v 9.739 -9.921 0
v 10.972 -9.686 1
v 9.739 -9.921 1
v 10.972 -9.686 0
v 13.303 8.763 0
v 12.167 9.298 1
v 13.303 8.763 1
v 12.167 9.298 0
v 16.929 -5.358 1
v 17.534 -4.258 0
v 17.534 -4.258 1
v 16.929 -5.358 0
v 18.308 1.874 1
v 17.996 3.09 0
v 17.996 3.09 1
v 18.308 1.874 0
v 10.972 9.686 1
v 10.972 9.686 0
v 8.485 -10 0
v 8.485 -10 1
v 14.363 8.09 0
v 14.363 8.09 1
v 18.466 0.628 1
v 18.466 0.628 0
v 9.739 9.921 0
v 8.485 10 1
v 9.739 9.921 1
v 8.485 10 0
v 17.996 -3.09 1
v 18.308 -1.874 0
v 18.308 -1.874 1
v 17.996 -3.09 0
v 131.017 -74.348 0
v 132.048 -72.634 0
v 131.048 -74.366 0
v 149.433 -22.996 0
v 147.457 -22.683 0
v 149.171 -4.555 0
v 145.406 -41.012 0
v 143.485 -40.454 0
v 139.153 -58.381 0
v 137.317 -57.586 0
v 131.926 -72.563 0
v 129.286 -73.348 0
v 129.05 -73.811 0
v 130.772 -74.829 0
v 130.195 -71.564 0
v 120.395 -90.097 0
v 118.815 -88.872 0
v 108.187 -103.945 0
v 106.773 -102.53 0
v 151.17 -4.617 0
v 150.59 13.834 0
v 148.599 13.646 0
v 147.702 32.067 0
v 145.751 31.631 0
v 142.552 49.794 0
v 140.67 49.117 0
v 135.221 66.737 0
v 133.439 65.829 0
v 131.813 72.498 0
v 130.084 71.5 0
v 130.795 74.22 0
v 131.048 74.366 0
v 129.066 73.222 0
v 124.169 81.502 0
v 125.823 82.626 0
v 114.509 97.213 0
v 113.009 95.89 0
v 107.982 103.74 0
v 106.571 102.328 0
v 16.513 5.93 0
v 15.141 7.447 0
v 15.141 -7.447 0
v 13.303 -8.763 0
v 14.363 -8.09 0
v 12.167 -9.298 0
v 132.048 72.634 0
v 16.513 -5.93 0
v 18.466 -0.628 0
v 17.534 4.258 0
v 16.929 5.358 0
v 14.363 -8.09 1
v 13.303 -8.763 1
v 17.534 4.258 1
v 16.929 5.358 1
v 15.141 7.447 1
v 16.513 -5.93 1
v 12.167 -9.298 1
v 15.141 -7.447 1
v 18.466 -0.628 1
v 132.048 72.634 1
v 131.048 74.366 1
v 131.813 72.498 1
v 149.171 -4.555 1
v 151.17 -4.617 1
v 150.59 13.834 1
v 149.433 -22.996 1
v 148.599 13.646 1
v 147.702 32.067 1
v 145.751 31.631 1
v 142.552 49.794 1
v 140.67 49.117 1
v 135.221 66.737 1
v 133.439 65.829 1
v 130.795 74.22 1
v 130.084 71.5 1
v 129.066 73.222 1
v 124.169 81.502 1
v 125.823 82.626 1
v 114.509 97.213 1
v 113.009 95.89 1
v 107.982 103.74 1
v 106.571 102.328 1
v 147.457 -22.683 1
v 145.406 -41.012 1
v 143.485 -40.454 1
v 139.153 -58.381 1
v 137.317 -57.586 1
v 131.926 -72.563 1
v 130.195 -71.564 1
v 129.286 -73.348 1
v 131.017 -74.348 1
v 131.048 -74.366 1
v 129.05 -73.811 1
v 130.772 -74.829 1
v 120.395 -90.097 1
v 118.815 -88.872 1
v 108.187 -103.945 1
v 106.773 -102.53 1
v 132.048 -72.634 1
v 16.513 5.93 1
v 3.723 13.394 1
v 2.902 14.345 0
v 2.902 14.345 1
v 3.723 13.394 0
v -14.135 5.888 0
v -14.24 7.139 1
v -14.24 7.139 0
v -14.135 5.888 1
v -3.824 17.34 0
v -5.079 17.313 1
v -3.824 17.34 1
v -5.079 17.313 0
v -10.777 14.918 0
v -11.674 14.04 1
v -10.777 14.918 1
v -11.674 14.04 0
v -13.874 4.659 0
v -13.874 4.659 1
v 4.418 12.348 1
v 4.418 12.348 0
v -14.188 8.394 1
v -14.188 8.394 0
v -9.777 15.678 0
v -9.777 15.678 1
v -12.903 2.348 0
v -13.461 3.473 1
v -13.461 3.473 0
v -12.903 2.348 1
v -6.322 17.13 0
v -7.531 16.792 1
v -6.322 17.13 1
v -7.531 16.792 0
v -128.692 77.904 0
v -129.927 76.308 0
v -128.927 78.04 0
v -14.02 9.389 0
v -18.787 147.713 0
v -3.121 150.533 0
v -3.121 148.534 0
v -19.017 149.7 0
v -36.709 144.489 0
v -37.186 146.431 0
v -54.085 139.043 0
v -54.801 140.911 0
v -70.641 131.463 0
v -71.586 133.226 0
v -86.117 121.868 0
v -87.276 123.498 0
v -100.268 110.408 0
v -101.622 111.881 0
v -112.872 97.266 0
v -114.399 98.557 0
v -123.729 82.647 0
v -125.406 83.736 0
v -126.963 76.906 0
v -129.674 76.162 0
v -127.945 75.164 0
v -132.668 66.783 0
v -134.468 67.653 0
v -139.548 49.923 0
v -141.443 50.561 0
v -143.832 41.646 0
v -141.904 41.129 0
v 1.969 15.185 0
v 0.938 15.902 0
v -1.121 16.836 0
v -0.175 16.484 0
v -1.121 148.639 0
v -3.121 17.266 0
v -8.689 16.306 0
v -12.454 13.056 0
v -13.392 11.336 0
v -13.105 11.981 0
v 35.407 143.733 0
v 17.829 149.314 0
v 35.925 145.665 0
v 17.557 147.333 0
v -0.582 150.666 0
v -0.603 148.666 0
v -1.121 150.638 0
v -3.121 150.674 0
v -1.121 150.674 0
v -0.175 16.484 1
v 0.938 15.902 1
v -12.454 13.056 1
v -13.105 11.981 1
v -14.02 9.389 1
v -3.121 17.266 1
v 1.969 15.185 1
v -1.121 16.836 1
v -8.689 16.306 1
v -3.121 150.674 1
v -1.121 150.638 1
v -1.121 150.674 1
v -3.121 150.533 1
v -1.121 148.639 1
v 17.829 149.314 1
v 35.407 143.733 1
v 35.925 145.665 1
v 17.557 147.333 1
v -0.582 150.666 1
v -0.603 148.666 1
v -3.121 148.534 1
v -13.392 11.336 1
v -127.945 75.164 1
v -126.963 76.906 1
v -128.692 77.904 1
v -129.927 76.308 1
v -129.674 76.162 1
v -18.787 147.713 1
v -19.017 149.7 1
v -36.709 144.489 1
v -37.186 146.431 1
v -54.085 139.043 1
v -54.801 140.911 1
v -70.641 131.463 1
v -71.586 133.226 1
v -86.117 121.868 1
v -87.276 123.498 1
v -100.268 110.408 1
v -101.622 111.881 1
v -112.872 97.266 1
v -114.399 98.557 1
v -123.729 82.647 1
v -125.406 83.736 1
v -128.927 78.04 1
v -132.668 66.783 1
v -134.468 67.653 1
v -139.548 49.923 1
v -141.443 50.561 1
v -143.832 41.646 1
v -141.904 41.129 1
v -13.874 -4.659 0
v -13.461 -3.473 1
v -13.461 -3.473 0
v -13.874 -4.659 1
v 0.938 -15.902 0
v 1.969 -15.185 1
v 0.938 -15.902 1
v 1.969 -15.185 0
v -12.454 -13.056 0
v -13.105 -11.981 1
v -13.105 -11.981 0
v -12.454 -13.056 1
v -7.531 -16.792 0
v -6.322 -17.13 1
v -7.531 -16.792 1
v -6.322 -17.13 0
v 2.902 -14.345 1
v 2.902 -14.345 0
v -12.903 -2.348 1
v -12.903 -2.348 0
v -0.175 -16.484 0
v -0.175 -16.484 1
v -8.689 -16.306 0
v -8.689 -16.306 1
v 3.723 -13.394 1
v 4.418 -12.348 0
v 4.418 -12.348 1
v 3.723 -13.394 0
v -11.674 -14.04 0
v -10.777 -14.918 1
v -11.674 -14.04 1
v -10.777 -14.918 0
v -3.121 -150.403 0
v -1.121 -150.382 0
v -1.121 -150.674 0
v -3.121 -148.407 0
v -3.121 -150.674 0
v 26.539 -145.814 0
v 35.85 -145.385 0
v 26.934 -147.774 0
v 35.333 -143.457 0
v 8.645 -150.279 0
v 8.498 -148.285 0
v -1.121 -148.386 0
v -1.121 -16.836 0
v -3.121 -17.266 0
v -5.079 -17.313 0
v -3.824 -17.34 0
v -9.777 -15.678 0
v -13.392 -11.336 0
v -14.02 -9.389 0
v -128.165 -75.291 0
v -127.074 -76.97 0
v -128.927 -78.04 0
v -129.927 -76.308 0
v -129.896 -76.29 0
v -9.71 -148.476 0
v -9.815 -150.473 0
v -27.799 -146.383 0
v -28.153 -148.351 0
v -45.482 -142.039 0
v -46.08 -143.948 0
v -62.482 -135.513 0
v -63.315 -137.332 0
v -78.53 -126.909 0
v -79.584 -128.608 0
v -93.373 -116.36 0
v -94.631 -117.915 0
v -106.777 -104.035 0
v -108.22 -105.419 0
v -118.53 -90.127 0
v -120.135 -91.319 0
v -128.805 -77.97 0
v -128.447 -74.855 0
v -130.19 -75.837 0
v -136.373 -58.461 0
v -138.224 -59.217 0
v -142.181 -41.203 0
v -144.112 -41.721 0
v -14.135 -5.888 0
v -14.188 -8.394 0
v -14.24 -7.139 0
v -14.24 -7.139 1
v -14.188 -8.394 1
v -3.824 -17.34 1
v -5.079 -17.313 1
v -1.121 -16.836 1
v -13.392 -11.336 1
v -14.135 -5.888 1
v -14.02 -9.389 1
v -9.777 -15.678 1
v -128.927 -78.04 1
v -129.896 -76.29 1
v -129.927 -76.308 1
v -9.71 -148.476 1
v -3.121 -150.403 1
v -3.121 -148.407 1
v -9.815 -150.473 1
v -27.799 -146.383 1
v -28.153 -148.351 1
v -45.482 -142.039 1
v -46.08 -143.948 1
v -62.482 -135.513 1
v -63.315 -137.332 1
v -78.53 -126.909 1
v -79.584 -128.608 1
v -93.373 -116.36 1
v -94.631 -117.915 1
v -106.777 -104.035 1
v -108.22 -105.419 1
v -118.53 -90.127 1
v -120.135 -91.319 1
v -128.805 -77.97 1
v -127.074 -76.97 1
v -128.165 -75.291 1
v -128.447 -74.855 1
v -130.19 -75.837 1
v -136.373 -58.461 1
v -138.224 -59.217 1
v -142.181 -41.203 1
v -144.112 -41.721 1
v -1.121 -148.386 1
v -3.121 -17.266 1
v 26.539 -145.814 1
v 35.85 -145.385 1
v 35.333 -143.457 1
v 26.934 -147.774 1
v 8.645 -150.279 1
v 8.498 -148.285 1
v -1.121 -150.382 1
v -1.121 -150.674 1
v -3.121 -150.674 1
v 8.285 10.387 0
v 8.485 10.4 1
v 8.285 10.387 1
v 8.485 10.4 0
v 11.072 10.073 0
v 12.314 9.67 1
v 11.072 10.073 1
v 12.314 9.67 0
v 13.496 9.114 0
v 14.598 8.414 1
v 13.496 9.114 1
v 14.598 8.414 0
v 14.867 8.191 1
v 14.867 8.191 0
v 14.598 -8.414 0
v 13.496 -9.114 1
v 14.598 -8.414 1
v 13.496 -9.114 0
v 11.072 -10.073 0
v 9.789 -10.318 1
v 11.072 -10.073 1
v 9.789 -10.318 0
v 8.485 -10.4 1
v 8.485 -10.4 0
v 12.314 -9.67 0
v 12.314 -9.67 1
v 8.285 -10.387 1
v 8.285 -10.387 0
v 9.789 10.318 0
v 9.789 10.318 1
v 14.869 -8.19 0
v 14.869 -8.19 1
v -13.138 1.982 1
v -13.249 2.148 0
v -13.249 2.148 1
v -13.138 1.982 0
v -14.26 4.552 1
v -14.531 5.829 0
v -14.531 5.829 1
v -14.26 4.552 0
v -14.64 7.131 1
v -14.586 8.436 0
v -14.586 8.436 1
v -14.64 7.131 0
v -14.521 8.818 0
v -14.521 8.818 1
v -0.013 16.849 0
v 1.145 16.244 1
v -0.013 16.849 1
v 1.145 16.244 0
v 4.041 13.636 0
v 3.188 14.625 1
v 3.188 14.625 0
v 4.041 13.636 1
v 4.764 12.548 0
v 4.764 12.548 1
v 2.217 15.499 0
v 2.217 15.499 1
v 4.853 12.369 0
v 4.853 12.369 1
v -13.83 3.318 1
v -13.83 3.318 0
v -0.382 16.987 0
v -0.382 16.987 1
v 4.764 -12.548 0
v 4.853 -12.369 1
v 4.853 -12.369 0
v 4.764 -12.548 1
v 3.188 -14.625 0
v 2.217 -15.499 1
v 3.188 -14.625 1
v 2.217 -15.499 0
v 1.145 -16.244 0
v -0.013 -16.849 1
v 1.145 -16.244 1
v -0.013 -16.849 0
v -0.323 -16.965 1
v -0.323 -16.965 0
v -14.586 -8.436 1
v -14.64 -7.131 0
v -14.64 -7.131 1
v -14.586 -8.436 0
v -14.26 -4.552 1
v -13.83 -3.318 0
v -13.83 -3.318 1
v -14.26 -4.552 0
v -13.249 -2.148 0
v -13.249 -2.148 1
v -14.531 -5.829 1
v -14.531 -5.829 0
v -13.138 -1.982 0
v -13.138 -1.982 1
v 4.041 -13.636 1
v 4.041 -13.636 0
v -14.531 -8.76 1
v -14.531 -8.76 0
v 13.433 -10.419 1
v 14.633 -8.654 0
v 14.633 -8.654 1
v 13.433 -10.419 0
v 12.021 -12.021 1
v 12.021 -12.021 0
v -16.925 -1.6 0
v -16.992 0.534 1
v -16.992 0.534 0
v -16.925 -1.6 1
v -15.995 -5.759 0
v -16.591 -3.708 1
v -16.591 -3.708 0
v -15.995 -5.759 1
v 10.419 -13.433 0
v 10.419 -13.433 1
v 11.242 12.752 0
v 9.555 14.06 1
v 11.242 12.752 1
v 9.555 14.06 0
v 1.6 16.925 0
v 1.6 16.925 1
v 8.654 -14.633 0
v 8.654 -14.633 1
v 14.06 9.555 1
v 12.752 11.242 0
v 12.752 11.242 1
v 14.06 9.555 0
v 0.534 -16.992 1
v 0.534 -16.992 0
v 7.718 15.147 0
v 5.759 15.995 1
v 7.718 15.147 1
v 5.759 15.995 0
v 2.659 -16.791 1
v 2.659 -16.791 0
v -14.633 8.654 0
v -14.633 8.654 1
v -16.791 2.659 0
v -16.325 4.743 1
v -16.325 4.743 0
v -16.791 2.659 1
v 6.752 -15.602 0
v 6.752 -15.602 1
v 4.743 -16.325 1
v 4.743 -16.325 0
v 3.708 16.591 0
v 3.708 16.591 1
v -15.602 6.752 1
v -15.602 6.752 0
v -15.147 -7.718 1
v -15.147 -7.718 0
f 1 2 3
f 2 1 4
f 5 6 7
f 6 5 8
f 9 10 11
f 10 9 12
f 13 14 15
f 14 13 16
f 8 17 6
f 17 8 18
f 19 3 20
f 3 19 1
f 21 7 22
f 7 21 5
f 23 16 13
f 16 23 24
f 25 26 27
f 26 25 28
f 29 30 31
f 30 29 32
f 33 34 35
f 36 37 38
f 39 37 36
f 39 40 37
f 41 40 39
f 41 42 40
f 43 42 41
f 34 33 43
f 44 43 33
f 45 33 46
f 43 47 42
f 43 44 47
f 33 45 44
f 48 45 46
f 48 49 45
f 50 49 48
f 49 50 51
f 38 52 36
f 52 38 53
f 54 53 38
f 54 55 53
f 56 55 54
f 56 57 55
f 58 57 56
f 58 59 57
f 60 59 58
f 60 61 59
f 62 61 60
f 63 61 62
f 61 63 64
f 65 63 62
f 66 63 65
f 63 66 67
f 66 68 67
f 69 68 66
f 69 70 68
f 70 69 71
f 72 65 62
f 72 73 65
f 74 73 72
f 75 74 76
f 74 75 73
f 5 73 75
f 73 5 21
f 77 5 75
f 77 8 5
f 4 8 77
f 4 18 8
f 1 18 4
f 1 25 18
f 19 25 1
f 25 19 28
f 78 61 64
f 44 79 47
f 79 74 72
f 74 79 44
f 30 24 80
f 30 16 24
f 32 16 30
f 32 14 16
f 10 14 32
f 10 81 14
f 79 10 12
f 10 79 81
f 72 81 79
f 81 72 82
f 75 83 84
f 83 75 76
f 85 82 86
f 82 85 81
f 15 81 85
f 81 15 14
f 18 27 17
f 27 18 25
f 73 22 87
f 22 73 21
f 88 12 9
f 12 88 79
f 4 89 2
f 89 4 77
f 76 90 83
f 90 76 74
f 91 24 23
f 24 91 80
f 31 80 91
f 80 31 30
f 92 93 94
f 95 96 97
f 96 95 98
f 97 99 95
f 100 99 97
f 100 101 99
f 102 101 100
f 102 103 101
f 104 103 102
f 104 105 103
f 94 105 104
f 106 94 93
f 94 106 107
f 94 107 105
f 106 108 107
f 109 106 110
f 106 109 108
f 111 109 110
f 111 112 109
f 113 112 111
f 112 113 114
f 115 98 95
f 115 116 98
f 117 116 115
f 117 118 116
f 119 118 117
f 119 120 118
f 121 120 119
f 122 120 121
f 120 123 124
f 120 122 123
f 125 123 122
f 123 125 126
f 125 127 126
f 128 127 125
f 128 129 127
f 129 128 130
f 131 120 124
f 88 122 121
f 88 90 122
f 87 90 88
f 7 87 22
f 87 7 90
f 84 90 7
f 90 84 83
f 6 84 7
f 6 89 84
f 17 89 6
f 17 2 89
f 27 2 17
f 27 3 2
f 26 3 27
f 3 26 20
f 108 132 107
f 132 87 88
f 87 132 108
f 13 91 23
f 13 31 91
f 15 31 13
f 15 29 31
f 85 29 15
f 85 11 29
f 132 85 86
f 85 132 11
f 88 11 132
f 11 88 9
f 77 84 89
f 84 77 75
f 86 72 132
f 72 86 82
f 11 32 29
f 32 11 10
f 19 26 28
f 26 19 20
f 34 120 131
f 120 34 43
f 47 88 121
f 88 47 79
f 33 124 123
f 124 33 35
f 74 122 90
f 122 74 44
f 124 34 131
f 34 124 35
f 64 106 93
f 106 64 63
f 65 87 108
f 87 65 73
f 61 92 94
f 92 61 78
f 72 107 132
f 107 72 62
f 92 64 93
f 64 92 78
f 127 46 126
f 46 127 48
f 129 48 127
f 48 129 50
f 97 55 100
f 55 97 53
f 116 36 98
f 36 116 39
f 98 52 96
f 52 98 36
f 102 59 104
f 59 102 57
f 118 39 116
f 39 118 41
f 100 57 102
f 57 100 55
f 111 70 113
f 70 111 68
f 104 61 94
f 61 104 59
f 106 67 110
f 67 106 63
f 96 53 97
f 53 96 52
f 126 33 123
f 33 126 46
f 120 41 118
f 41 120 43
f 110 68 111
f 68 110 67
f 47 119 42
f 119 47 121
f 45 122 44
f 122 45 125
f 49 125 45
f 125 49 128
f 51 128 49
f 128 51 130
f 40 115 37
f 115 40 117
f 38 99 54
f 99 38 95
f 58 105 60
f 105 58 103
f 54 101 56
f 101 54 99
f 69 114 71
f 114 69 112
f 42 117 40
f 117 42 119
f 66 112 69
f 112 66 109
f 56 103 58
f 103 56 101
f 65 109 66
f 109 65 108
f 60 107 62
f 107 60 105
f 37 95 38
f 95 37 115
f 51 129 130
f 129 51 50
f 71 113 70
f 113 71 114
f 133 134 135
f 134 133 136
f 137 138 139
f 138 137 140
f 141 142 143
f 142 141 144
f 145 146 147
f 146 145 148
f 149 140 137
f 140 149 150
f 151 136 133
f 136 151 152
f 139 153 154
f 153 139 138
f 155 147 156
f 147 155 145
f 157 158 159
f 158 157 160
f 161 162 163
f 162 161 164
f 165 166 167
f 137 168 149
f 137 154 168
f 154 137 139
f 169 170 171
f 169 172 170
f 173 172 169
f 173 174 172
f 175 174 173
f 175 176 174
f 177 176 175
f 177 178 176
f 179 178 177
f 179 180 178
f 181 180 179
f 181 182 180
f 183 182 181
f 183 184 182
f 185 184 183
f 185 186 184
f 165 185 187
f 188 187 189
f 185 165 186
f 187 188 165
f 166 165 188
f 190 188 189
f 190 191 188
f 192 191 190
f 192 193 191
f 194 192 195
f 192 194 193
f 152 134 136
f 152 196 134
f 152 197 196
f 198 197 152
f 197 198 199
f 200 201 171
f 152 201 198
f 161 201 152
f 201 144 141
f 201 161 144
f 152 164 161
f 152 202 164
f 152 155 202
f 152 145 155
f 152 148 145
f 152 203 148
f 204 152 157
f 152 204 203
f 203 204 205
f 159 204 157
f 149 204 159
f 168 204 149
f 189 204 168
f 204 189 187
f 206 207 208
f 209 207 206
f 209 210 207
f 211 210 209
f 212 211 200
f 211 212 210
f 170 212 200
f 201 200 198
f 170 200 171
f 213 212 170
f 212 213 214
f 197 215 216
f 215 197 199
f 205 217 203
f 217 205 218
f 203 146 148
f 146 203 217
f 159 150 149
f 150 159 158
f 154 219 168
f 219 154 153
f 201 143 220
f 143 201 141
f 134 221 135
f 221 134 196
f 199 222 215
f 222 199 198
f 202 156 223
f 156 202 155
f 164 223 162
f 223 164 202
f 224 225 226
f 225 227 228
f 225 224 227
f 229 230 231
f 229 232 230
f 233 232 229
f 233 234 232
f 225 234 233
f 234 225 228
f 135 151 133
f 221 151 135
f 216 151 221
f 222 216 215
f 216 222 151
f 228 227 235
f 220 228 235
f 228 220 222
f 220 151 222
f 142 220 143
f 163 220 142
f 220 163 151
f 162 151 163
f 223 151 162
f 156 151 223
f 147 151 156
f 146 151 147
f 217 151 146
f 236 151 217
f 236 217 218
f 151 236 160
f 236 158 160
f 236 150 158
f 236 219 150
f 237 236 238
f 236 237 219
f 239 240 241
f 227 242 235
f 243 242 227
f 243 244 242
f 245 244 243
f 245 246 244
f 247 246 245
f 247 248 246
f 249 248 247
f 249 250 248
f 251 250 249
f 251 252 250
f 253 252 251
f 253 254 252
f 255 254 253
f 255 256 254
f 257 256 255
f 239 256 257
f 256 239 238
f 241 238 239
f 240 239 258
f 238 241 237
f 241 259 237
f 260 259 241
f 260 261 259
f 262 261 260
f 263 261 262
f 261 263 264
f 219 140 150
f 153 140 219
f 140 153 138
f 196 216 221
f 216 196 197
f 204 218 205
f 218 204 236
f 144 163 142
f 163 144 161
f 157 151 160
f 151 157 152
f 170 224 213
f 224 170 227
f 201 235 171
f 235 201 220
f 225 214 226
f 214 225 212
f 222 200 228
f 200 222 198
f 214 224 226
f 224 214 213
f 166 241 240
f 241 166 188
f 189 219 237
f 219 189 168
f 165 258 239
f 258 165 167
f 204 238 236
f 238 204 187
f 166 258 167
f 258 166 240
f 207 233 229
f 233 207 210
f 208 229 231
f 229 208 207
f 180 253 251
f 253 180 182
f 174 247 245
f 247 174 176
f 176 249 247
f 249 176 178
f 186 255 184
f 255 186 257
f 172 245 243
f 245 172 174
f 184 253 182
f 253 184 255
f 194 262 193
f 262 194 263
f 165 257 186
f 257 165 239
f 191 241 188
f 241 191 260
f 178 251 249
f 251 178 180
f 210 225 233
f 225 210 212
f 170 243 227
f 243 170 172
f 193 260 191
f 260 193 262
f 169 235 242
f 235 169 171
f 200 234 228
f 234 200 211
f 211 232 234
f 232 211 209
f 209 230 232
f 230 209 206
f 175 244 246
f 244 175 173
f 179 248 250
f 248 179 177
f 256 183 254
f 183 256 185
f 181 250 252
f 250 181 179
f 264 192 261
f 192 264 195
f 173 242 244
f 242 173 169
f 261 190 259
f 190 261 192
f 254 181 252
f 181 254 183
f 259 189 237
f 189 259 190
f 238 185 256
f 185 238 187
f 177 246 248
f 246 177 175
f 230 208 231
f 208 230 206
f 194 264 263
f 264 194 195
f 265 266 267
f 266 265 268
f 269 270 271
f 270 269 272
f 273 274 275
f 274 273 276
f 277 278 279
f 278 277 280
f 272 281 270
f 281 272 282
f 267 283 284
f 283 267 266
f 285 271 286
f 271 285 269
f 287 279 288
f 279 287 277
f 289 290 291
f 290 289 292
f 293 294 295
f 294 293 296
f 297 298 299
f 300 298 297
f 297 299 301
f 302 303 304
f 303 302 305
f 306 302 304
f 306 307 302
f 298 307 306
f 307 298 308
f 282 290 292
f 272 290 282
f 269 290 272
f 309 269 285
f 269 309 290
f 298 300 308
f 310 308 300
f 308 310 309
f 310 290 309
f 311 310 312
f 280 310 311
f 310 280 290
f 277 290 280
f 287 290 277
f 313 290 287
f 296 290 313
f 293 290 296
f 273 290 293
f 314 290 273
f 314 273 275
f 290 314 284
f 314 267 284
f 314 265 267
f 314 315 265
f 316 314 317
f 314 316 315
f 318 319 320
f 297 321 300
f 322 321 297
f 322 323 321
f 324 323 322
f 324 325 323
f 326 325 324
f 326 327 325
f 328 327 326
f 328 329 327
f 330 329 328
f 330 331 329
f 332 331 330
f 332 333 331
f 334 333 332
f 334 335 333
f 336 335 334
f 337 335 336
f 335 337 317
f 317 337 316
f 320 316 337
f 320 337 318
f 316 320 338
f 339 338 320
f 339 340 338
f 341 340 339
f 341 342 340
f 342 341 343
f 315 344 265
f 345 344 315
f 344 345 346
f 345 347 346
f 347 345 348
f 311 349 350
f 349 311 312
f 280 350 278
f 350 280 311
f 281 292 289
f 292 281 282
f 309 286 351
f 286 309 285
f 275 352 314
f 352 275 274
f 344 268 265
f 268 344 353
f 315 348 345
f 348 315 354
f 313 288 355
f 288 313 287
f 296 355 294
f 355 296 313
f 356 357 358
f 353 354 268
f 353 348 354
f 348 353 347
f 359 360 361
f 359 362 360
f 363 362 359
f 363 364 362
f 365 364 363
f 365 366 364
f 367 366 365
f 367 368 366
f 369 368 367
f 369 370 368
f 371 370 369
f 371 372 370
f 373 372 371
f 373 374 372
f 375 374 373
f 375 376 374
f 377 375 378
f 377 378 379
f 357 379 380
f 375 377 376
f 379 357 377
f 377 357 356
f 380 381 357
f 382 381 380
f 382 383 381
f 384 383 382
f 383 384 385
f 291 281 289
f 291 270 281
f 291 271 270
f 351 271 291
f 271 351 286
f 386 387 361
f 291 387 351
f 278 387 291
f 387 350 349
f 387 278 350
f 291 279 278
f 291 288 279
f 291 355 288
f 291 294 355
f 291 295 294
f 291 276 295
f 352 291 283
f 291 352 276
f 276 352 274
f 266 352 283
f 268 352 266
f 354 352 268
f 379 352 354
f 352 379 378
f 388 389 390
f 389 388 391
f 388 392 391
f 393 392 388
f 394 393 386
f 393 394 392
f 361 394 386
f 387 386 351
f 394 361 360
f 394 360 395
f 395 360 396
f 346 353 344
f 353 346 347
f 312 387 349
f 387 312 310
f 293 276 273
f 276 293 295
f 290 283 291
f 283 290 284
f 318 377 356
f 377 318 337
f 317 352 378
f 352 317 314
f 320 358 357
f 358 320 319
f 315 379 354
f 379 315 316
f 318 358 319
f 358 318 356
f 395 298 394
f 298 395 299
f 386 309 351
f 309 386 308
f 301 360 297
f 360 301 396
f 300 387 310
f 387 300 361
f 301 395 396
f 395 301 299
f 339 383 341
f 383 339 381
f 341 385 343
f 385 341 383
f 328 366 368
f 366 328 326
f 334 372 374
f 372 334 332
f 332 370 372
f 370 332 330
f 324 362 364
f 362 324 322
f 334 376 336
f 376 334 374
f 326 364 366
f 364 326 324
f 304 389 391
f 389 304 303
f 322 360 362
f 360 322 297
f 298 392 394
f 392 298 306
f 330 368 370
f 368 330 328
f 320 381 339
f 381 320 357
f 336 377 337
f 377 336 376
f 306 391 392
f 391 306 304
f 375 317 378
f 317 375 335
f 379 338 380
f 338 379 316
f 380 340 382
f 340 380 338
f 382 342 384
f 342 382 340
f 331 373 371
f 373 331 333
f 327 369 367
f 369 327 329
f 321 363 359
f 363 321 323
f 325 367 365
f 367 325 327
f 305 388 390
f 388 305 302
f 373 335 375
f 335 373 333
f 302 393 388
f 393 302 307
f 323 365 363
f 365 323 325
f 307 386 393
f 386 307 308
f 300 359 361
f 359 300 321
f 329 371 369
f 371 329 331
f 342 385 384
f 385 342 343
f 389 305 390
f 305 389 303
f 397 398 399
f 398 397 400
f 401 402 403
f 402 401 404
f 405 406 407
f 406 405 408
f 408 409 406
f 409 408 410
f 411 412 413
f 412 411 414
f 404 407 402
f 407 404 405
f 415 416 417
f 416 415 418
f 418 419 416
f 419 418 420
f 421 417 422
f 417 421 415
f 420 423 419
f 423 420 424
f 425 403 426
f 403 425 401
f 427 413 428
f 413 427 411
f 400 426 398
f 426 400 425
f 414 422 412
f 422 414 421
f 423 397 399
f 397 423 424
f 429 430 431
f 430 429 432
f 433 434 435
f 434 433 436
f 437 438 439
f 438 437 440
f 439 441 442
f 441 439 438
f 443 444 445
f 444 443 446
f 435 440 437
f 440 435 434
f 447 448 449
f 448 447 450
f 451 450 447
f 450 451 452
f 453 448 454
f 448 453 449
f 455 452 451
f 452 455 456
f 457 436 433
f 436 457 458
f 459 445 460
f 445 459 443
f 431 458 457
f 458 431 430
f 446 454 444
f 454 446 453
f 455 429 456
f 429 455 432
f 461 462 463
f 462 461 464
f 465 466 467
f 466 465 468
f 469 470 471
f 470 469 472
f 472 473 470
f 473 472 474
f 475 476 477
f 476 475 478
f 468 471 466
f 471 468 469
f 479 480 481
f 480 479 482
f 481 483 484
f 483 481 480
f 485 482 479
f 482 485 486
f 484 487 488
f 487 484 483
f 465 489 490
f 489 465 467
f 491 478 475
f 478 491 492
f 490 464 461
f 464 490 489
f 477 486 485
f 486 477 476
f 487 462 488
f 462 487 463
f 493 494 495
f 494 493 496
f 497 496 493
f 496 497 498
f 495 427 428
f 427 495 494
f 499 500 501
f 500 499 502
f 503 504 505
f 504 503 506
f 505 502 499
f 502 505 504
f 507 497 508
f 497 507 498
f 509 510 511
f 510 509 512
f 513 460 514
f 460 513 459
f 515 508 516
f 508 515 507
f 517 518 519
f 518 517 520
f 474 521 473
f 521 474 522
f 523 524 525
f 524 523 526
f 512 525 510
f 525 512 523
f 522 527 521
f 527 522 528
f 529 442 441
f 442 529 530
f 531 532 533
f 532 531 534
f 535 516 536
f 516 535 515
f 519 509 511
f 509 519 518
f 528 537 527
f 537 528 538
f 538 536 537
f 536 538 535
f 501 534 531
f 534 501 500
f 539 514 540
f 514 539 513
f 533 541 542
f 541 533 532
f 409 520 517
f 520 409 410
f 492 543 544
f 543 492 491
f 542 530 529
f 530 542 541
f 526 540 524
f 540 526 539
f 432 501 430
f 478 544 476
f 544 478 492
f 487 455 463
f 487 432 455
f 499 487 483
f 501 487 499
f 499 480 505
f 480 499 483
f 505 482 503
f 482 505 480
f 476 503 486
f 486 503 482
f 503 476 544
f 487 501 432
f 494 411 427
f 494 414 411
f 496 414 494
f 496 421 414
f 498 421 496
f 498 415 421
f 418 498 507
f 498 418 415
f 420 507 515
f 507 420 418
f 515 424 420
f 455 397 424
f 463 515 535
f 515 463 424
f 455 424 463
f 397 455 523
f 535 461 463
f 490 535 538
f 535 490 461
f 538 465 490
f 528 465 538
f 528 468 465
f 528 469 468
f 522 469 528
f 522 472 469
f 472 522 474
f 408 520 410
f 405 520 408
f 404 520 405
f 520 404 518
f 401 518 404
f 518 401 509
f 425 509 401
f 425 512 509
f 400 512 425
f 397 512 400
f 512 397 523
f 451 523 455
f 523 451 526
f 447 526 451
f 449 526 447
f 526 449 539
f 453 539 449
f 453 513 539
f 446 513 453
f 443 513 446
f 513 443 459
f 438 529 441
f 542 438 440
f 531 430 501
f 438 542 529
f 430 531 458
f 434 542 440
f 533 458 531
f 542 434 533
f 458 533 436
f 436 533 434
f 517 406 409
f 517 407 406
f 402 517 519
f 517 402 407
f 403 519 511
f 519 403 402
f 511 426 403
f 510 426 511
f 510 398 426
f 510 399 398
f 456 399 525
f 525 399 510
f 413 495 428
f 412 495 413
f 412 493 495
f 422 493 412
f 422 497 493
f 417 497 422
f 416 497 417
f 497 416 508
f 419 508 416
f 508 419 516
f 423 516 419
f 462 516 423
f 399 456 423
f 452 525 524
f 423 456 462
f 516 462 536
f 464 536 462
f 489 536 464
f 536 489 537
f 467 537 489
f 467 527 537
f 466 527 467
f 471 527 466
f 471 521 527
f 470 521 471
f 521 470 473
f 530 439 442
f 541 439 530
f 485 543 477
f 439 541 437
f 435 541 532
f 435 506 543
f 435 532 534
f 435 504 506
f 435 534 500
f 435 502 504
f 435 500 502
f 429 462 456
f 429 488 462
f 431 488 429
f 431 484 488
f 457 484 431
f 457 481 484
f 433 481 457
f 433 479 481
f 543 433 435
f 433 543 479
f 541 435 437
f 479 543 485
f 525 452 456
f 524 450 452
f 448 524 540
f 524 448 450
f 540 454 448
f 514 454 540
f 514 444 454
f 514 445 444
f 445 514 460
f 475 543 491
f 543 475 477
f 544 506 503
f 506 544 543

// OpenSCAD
// -----------------------------------------------------
// BlumentopfUntersatz
//
//  Detlev Ahlgrimm, 08.2018
// -----------------------------------------------------

// Diameter
dia=300;  // [50:380]

// Height
hgt=1;    // [1:5]

render=0; //  [0:all together/assembled, 1:arm part, 2:center part, 3:center part + 140mm, 4:all together + 140mm]

/* [Hidden] */
$fn=50;
wt=2;


// -----------------------------------------------------
//   r : Radius (innen)
//   w : Wandstaerke
//   h : Hoehe
// -----------------------------------------------------
module Rohr(r, w, h) {
  difference() { cylinder(r=r+w, h=h); translate([0, 0, -0.1]) cylinder(r=r, h=h+0.2); }
}


// -----------------------------------------------------
//
// -----------------------------------------------------
module UntersatzDrittel() {
  translate([3, 3, 0]) rotate([0, 0, -45+180]) difference() {
    cylinder(r=10, hgt);
    translate([-10, 0, -0.1]) cube([20, 10, hgt+0.2]);
  }
  for(a=[15, 75]) {
    rotate([0, 0, a]) translate([10, -wt/2, 0]) cube([dia/2-10-3, wt, hgt]);
  }
  difference() {
    Rohr(dia/2-wt-3, wt, hgt);
    translate([-dia/2, -dia/2, -0.1]) cube([dia, dia/2, hgt+0.2]);
    translate([-dia/2, -0.1, -0.1]) cube([dia/2, dia/2+0.2, hgt+0.2]);
  }
}
//!rotate([0, 0, -15]) UntersatzDrittel();
//!UntersatzDrittel();


// -----------------------------------------------------
//
// -----------------------------------------------------
module Untersatz() {
  for(a=[0:120:359]) {
    rotate([0, 0, a]) translate([3, 3, 0]) UntersatzDrittel();
  }
}


// -----------------------------------------------------
//
// -----------------------------------------------------
module Untersatz_plus140mm(lng=49) {
  for(a=[0:120:359]) {
    rotate([0, 0, a]) translate([lng+3, lng+3, 0]) UntersatzDrittel();
  }
}


// -----------------------------------------------------
//
// -----------------------------------------------------
module Verbinder() {
  difference() {
    cylinder(r=17, h=hgt);
    for(a=[0:120:359]) {
      rotate([0, 0, a]) translate([6, 6, -0.1]) rotate([0, 0, -45+180]) difference() {
        cylinder(r=10.4, hgt+0.2);
        translate([-11, 0.2, -0.1]) cube([22, 11, hgt+0.4]);
      }
    }
  }
}


// -----------------------------------------------------
//
// -----------------------------------------------------
module Verbinder_plus140mm(lng=49) {
  difference() {
    for(a=[0:120:359]) {
      rotate([0, 0, a]) translate([lng, lng, 0]) rotate([0, 0, -45+180]) difference() {
        cylinder(r=17, h=hgt);
        translate([-18, 0, -0.1]) cube([36, 18, hgt+0.4]);
      }
    }
    for(a=[0:120:359]) {
      rotate([0, 0, a]) translate([lng+6, lng+6, -0.1]) rotate([0, 0, -45+180]) difference() {
        cylinder(r=10.4, hgt+0.2);
        translate([-11, 0.2, -0.1]) cube([22, 11, hgt+0.4]);
      }
    }
  }
  cylinder(d=10, h=hgt);
  for(a=[0:120:359]) {
    hull() {
      cylinder(d=wt, h=hgt);
      rotate([0, 0, a]) translate([lng, lng, 0]) rotate([0, 0, -45+180]) cylinder(d=wt, h=hgt);
    }
  }
}



if(render==0) {
  rotate([0, 0, -45]) Untersatz();
  rotate([0, 0, -45]) Verbinder();
} else if(render==1) {
  translate([4, 4, 0]) UntersatzDrittel();
} else if(render==2) {
  Verbinder();
} else if(render==3) {
  Verbinder_plus140mm();
} else if(render==4) {
  rotate([0, 0, -45]) Untersatz_plus140mm();
  rotate([0, 0, -45]) Verbinder_plus140mm();
}
